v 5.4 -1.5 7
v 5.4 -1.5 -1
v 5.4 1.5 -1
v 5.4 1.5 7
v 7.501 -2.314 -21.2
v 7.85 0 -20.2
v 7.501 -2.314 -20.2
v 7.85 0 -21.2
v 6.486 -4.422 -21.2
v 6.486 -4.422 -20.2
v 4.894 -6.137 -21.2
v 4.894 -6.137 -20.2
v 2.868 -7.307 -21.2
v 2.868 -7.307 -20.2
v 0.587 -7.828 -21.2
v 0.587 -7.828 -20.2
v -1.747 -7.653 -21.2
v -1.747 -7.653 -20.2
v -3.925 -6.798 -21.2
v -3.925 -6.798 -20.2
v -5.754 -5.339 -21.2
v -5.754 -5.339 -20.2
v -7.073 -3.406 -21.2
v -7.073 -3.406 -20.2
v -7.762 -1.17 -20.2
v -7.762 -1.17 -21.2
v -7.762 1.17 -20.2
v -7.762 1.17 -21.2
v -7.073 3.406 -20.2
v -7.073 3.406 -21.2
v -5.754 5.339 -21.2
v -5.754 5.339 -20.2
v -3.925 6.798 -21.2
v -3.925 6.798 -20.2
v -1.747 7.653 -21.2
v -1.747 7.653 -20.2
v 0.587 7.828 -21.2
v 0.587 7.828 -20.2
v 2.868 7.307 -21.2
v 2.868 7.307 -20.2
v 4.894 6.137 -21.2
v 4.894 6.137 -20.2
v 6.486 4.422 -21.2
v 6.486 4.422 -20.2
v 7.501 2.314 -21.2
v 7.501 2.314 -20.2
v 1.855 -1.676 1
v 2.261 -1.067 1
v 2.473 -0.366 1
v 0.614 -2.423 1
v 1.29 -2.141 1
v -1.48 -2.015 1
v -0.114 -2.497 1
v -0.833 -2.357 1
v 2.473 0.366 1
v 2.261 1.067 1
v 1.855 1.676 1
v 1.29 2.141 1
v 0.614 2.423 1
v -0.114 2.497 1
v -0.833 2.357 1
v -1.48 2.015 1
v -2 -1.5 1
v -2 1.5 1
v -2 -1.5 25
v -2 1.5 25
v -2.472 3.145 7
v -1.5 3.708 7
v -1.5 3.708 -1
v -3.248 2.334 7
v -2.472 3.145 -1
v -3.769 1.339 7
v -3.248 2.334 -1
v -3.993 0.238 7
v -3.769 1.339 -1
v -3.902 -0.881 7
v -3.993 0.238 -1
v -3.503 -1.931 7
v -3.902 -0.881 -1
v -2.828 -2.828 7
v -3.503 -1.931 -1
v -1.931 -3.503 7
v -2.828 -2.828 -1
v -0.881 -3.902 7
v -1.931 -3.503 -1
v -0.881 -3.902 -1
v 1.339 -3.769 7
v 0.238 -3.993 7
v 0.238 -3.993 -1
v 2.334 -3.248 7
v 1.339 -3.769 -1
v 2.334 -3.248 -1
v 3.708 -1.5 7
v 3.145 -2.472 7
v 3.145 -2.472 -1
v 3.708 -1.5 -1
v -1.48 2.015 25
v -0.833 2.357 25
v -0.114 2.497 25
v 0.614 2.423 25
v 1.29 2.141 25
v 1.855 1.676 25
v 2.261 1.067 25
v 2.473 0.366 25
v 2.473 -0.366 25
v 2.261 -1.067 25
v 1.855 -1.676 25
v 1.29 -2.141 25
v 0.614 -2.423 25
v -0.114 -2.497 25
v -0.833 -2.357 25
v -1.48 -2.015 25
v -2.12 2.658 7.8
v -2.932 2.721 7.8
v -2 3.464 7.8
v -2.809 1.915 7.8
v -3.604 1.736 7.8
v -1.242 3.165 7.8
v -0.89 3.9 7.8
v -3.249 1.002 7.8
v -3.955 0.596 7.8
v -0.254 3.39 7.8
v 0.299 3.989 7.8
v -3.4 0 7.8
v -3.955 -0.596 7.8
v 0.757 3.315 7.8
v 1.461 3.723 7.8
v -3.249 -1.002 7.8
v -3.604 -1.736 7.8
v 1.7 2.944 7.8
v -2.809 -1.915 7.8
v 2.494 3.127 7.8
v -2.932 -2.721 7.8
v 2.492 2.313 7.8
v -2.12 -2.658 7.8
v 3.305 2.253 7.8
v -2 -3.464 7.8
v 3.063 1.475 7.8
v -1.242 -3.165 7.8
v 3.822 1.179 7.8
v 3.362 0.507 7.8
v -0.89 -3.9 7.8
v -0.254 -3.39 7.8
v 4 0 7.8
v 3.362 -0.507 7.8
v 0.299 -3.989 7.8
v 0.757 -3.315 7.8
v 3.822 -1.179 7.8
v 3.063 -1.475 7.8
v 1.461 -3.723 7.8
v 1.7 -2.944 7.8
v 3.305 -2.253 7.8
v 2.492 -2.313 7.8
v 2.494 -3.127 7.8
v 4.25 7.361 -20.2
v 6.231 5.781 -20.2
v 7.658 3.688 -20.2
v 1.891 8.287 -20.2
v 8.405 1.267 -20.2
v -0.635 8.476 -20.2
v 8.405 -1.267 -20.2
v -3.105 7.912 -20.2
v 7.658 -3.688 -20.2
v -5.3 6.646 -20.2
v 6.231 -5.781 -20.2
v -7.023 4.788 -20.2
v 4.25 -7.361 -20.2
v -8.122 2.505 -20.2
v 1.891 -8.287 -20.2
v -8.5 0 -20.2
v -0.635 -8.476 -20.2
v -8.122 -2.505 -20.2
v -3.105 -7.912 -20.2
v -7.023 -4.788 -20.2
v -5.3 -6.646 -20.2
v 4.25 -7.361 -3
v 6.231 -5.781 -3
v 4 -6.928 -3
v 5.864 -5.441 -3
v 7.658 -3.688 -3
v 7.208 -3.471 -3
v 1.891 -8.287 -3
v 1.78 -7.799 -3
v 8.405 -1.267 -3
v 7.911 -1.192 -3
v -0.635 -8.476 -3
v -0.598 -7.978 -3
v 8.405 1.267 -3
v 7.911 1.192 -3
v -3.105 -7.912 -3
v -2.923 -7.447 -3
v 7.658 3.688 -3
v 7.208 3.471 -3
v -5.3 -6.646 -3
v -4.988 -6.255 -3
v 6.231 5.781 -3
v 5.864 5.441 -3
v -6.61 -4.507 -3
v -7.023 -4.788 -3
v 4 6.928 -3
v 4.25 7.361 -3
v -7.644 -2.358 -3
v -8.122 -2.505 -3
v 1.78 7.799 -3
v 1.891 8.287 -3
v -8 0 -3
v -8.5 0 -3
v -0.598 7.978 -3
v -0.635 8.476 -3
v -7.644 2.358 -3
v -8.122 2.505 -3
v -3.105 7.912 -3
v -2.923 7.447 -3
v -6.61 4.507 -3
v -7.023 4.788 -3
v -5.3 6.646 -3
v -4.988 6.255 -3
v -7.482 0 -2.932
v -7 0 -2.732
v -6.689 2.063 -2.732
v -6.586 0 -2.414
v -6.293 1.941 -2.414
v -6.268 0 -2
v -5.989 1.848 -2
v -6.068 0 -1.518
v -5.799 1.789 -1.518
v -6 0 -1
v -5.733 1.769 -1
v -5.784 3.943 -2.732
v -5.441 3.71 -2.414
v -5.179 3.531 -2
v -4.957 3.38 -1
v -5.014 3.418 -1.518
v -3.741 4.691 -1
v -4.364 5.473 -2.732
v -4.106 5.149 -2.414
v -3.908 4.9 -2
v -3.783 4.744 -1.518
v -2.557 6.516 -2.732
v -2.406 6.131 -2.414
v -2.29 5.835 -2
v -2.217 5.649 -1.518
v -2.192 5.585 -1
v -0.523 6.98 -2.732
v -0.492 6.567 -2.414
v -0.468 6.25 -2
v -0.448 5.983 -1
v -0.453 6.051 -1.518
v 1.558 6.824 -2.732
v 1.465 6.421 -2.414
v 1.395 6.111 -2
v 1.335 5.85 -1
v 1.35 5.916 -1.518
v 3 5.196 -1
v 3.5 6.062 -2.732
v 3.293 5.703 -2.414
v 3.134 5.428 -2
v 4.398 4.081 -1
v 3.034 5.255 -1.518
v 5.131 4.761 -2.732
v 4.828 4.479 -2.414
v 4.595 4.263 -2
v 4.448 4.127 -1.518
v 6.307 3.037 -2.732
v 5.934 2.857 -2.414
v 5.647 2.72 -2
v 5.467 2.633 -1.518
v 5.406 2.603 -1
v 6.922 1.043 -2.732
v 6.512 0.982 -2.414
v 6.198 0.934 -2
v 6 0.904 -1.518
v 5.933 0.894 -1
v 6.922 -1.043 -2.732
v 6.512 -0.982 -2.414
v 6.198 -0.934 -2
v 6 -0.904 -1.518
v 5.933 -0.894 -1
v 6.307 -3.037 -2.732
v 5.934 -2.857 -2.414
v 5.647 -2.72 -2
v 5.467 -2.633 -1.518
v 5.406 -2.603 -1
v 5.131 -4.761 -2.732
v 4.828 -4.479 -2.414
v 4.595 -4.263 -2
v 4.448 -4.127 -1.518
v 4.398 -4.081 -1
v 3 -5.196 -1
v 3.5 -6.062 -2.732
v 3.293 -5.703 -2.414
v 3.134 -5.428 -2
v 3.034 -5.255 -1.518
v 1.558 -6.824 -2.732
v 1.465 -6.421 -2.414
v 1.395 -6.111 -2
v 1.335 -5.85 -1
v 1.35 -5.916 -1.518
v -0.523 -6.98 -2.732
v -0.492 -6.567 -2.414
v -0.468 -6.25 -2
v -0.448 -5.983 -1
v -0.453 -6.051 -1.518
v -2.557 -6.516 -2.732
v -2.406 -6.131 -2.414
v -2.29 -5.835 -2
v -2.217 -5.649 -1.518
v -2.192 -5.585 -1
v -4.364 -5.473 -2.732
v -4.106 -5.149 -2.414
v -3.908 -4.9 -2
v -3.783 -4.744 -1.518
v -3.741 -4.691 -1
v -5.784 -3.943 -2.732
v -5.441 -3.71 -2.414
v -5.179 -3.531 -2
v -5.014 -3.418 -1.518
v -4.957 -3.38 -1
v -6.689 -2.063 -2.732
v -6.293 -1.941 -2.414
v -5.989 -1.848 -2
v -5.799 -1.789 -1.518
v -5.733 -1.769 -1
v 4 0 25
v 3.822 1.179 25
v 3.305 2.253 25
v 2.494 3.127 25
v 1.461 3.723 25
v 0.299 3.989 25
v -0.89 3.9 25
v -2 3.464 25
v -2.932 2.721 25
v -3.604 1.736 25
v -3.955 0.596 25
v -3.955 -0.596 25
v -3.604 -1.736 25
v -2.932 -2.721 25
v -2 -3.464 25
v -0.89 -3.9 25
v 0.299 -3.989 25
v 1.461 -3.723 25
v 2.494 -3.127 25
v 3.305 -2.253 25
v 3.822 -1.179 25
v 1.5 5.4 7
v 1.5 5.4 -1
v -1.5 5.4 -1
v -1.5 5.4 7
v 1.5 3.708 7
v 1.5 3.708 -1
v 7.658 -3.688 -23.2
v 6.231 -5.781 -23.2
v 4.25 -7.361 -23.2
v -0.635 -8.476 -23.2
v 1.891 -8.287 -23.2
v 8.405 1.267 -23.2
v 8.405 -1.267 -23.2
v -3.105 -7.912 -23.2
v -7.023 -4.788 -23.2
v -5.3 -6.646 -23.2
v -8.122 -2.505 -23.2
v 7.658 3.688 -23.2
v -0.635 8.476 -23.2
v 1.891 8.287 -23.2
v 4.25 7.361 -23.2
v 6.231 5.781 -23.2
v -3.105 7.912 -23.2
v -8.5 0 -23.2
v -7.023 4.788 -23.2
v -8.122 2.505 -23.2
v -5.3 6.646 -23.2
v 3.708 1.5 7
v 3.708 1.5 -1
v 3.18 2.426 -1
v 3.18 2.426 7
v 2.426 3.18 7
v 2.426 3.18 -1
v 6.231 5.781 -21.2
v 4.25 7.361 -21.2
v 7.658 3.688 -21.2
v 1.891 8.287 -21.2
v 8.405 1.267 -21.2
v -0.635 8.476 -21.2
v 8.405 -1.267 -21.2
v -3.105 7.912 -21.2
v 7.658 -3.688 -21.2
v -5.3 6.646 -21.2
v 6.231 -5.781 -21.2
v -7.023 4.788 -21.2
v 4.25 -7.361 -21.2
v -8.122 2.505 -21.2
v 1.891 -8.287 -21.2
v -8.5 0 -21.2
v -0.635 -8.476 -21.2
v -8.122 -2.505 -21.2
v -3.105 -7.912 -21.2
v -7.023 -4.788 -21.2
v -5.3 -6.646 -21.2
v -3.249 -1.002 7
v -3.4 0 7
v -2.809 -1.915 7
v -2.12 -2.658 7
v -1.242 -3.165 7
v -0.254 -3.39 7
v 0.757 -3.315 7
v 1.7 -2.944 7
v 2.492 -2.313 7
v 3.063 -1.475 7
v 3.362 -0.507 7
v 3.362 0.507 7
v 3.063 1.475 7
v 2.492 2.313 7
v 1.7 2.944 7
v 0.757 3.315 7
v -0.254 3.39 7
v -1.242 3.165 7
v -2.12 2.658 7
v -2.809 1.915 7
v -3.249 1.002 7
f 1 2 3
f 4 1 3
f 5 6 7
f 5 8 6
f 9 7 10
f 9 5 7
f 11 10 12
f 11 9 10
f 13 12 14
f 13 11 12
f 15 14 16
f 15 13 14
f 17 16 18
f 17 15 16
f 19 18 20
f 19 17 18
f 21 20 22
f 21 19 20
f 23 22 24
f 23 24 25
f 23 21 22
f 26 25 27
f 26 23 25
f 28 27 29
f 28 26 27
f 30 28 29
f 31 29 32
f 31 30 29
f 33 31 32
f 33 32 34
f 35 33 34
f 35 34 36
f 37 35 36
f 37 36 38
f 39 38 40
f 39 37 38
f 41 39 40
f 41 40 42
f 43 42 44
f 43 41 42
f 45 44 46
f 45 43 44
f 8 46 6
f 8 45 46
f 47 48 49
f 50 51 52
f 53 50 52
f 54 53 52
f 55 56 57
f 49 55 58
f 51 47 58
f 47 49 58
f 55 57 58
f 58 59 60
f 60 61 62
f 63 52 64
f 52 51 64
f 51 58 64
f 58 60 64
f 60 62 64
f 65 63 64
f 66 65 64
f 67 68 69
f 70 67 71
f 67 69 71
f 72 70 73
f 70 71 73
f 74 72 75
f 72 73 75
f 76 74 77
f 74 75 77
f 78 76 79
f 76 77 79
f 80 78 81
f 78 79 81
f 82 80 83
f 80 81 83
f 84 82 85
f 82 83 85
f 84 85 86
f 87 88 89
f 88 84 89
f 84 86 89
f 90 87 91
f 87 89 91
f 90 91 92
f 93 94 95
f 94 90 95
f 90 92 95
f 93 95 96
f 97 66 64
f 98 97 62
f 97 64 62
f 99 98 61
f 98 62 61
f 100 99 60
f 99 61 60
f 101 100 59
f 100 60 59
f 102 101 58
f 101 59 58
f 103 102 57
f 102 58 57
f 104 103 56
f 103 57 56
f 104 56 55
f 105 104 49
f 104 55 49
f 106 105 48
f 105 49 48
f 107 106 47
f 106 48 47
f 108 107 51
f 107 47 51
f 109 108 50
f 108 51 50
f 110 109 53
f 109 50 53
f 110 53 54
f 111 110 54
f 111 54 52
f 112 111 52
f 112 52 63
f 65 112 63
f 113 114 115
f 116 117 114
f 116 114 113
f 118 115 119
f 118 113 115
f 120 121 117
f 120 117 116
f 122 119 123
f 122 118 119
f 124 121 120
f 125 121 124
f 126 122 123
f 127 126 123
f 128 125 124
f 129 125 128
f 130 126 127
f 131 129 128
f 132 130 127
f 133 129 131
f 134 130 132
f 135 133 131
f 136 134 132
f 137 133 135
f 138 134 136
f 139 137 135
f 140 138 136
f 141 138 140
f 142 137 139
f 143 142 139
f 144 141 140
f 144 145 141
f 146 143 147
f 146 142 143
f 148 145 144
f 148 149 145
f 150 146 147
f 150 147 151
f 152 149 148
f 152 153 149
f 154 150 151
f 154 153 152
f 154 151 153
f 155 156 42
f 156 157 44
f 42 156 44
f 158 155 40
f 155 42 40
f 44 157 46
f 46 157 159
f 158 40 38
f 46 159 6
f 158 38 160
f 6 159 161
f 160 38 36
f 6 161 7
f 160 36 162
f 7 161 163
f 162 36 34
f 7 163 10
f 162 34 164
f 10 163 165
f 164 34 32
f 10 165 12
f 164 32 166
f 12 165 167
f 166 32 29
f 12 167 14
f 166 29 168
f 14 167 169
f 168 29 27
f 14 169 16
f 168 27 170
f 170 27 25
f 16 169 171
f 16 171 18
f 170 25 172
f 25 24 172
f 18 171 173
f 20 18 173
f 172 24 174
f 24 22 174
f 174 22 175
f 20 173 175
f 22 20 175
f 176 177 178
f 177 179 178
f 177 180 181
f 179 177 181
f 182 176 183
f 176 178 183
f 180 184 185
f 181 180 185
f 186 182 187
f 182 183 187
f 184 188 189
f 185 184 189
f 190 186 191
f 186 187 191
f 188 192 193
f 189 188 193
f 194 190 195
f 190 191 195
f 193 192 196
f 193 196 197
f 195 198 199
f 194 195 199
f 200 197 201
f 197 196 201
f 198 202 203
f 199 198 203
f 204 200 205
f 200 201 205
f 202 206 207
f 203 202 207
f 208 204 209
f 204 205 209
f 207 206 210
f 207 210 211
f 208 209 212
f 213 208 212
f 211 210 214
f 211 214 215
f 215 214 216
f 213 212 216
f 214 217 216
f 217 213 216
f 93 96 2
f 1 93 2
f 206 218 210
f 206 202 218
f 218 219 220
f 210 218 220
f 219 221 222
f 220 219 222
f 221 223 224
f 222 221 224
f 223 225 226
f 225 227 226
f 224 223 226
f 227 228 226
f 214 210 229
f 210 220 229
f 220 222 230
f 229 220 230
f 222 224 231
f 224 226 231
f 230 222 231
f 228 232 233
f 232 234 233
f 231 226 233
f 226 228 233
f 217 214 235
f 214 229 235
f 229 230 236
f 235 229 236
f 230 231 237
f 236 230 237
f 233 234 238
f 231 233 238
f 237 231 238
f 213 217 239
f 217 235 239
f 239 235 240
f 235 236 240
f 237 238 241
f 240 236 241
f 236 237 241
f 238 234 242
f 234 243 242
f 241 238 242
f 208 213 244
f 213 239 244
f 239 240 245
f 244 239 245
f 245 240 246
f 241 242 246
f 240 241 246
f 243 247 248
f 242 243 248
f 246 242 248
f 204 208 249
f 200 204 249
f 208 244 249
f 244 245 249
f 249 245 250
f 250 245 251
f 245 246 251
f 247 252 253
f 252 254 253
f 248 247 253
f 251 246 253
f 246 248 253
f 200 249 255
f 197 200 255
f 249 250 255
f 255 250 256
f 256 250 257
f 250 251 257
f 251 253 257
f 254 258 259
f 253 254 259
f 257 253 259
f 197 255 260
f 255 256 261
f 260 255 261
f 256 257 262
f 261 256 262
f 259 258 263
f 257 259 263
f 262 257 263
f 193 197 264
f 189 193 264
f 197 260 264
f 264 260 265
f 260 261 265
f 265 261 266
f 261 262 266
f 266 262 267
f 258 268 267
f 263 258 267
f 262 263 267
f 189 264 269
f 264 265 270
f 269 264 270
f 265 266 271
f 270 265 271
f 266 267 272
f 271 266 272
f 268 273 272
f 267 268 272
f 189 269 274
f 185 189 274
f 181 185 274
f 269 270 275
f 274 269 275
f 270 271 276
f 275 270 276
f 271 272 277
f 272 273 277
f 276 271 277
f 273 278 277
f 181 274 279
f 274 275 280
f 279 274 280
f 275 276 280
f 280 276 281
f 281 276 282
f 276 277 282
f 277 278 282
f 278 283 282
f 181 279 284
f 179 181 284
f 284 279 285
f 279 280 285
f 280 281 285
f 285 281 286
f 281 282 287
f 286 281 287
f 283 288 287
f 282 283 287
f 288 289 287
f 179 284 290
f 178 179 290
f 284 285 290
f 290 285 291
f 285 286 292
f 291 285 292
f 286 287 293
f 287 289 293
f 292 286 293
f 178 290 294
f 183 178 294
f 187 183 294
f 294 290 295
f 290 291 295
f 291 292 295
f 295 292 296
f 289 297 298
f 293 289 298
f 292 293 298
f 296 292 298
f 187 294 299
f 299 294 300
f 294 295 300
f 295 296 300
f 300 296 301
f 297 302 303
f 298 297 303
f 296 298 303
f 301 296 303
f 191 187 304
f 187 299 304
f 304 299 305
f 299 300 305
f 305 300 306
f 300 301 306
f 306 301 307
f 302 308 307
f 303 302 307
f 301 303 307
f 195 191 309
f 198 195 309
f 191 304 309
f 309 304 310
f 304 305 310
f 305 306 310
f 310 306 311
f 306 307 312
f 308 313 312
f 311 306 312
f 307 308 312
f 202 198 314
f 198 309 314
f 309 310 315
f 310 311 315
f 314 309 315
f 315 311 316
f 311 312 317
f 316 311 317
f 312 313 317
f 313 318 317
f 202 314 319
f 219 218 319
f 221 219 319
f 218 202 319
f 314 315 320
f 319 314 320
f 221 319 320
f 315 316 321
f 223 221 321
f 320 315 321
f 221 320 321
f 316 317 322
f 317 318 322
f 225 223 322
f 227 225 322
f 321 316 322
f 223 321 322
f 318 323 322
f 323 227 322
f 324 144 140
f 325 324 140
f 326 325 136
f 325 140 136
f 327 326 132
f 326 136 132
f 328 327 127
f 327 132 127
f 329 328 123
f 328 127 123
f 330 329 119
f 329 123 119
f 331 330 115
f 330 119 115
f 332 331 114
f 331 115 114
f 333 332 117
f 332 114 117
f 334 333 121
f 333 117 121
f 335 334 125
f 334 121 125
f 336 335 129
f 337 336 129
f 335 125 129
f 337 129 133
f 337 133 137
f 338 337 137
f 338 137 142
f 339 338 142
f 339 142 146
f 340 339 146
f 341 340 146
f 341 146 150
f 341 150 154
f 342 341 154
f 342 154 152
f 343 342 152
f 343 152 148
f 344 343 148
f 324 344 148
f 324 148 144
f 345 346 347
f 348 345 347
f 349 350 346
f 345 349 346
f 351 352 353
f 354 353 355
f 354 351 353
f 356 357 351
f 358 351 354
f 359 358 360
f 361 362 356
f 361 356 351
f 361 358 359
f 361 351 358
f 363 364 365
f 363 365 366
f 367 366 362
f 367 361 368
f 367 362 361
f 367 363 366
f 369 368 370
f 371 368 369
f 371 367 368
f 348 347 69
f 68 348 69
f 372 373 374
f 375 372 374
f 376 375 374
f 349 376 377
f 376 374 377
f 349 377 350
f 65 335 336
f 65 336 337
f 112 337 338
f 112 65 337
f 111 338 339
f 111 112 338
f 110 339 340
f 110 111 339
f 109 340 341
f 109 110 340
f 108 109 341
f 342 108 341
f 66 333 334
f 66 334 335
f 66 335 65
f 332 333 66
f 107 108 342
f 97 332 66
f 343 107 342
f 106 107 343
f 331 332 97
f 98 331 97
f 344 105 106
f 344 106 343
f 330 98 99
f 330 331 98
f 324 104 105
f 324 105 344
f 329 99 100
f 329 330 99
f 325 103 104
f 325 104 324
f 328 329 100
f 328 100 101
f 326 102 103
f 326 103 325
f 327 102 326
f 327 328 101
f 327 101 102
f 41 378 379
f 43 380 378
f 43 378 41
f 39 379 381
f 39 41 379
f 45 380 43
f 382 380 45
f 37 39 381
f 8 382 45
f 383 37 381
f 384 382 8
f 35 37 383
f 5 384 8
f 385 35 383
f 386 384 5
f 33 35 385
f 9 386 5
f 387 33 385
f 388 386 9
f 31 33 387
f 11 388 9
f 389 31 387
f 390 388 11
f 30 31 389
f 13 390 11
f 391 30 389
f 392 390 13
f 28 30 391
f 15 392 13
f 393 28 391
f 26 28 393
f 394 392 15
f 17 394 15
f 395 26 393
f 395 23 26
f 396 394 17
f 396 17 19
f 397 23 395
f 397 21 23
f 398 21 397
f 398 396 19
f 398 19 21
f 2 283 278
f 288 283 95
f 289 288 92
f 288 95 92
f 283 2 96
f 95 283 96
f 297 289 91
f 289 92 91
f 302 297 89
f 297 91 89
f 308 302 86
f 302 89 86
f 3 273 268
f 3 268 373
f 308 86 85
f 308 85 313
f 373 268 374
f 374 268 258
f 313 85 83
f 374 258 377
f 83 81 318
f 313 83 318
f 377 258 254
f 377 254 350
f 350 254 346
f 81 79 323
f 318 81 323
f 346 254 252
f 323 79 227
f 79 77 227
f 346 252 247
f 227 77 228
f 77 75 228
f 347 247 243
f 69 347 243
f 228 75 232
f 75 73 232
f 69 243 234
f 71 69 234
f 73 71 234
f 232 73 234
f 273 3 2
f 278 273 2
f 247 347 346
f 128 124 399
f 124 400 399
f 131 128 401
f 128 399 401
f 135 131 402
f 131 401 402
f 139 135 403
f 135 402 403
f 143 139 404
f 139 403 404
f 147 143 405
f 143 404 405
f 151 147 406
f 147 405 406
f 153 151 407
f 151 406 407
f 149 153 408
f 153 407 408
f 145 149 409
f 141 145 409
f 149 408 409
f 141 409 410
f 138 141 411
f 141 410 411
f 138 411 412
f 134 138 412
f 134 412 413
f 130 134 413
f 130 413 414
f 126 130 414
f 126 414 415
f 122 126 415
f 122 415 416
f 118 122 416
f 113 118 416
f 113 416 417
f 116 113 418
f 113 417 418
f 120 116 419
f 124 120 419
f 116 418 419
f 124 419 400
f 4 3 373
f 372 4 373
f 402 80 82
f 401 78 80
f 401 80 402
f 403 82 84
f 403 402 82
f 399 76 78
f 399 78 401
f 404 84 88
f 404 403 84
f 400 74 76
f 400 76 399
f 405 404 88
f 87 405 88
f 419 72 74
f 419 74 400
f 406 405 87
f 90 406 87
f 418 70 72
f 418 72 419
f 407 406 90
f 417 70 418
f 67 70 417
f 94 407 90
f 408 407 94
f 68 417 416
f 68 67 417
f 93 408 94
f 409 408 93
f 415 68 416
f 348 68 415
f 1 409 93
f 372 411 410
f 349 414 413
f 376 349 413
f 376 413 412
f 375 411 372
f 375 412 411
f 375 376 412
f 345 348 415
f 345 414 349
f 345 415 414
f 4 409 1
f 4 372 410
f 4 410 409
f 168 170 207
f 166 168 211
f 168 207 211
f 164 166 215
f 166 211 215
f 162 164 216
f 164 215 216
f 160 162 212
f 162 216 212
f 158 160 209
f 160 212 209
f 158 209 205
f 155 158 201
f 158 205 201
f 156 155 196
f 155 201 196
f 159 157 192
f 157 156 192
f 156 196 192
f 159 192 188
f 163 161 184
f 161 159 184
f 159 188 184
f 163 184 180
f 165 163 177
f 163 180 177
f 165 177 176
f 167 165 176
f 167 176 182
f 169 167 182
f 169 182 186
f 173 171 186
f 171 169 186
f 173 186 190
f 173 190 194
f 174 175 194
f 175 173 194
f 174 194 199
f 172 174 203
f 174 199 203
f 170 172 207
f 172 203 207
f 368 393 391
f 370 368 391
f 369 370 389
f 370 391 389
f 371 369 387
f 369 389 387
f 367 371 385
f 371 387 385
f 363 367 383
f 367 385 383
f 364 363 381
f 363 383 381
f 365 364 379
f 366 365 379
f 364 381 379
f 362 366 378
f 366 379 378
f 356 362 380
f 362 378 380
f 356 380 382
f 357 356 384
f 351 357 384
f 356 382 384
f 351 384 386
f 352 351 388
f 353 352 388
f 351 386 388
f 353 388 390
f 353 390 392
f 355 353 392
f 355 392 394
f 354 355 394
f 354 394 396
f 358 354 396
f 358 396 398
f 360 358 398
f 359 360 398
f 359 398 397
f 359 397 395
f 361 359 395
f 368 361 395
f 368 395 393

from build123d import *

# Parameters (mm, degrees)
EXTRUDE_1_DEPTH      = 25
EXTRUDE_1_DEPTH_BACK = 1
SKETCH_1_R           = 4
EXTRUDE_2_DEPTH      = 7
EXTRUDE_2_DEPTH_BACK = 1
SKETCH_2_R           = 2.5
EXTRUDE_3_DEPTH      = 2
EXTRUDE_START        = 2
SKETCH_2_3_R         = 6
SKETCH_2_3_R_2       = 2.5
EXTRUDE_4_DEPTH      = 2
SKETCH_4_W           = 0.8
SKETCH_4_H           = 0.6
SKETCH_5_R           = 8.5
EXTRUDE_5_DEPTH      = 20.2
SKETCH_6_W           = 1
SKETCH_6_H           = 0.65
FILLET_2_R           = 2


with BuildPart() as part:
    # 草图1 → 凸台-拉伸1 (new, two sides: drawn at the far end of the back side and taken through both)
    with BuildSketch(Plane.XY.offset(-EXTRUDE_1_DEPTH_BACK)):
        Circle(SKETCH_1_R)
        with BuildLine():
            Line((-2, -1.5), (-2, 1.5))
            ThreePointArc((-2, 1.5), (2.5, 0), (-2, -1.5))
        make_face(mode=Mode.SUBTRACT)
    extrude(amount=EXTRUDE_1_DEPTH + EXTRUDE_1_DEPTH_BACK)

    # 草图1<3> → 凸台-拉伸2 (add, two sides: drawn at the far end of the back side and taken through both)
    with BuildSketch(Plane.XY.offset(-EXTRUDE_2_DEPTH_BACK)):
        with BuildLine():
            Line((-1.5, 5.4), (-1.5, 3.708099244))
            ThreePointArc((-1.5, 3.708099244), (0, 4), (1.5, 3.708099244))
            Line((1.5, 3.708099244), (1.5, 5.4))
            Line((1.5, 5.4), (-1.5, 5.4))
        make_face()
        with BuildLine():
            Line((5.4, 1.5), (3.708099244, 1.5))
            ThreePointArc((3.708099244, 1.5), (4, 0), (3.708099244, -1.5))
            Line((3.708099244, -1.5), (5.4, -1.5))
            Line((5.4, -1.5), (5.4, 1.5))
        make_face()
    extrude(amount=EXTRUDE_2_DEPTH + EXTRUDE_2_DEPTH_BACK)

    # 草图2 → 凸台-拉伸3 (add)
    with BuildSketch(Plane(origin=(0, 0, -1), x_dir=(-1, 0, 0), z_dir=(0, 0, -1))):
        Circle(SKETCH_2_R)
    extrude(amount=-EXTRUDE_3_DEPTH)

    # 草图2<3> → 凸台-拉伸4 (add)
    # profile 1 of 2: a face of its own
    with BuildSketch(Plane(origin=(0, 0, -1), x_dir=(-1, 0, 0), z_dir=(0, 0, -1)).offset(EXTRUDE_START)):
        Circle(SKETCH_2_3_R)
        Circle(SKETCH_2_3_R_2, mode=Mode.SUBTRACT)
    # profile 2 of 2: a face of its own
    with BuildSketch(Plane(origin=(0, 0, -1), x_dir=(-1, 0, 0), z_dir=(0, 0, -1)).offset(EXTRUDE_START)):
        Circle(SKETCH_2_3_R_2)
    extrude(amount=-EXTRUDE_4_DEPTH)

    # 草图4 → 切除-旋转3 (revolve, cut)
    with BuildSketch(Plane(origin=(0, 0, 0), x_dir=(0, 0, -1), z_dir=(1, 0, 0)), mode=Mode.PRIVATE) as cut_revolve_3_sk:
        with Locations((-7.4, 3.7)):
            Rectangle(SKETCH_4_W, SKETCH_4_H)
    revolve(cut_revolve_3_sk.sketch.rotate(Axis((0, 0, 0), (0, 0, 1)), 90), axis=Axis((0, 0, 0), (0, 0, 1)), mode=Mode.SUBTRACT)

    # 草图5 → 凸台-拉伸5 (add)
    with BuildSketch(Plane(origin=(0, 0, -3), x_dir=(-1, 0, 0), z_dir=(0, 0, -1))):
        Circle(SKETCH_5_R)
    extrude(amount=EXTRUDE_5_DEPTH)

    # 草图6 → 切除-旋转4 (revolve, cut)
    with BuildSketch(Plane(origin=(0, 0, 0), x_dir=(0, 0, -1), z_dir=(1, 0, 0)), mode=Mode.PRIVATE) as cut_revolve_4_sk:
        with Locations((20.7, 8.175)):
            Rectangle(SKETCH_6_W, SKETCH_6_H)
    revolve(cut_revolve_4_sk.sketch.rotate(Axis((0, 0, 0), (0, 0, -1)), 90), axis=Axis((0, 0, 0), (0, 0, -1)), mode=Mode.SUBTRACT)

    # 圆角2
    fillet_2_edges = [part.edges().sort_by_distance(p)[0] for p in [
        (6, 0, -3),
    ]]
    fillet(fillet_2_edges, radius=FILLET_2_R - 0.0001)  # a hair under: the kernel refuses the full size


solid = part.part
